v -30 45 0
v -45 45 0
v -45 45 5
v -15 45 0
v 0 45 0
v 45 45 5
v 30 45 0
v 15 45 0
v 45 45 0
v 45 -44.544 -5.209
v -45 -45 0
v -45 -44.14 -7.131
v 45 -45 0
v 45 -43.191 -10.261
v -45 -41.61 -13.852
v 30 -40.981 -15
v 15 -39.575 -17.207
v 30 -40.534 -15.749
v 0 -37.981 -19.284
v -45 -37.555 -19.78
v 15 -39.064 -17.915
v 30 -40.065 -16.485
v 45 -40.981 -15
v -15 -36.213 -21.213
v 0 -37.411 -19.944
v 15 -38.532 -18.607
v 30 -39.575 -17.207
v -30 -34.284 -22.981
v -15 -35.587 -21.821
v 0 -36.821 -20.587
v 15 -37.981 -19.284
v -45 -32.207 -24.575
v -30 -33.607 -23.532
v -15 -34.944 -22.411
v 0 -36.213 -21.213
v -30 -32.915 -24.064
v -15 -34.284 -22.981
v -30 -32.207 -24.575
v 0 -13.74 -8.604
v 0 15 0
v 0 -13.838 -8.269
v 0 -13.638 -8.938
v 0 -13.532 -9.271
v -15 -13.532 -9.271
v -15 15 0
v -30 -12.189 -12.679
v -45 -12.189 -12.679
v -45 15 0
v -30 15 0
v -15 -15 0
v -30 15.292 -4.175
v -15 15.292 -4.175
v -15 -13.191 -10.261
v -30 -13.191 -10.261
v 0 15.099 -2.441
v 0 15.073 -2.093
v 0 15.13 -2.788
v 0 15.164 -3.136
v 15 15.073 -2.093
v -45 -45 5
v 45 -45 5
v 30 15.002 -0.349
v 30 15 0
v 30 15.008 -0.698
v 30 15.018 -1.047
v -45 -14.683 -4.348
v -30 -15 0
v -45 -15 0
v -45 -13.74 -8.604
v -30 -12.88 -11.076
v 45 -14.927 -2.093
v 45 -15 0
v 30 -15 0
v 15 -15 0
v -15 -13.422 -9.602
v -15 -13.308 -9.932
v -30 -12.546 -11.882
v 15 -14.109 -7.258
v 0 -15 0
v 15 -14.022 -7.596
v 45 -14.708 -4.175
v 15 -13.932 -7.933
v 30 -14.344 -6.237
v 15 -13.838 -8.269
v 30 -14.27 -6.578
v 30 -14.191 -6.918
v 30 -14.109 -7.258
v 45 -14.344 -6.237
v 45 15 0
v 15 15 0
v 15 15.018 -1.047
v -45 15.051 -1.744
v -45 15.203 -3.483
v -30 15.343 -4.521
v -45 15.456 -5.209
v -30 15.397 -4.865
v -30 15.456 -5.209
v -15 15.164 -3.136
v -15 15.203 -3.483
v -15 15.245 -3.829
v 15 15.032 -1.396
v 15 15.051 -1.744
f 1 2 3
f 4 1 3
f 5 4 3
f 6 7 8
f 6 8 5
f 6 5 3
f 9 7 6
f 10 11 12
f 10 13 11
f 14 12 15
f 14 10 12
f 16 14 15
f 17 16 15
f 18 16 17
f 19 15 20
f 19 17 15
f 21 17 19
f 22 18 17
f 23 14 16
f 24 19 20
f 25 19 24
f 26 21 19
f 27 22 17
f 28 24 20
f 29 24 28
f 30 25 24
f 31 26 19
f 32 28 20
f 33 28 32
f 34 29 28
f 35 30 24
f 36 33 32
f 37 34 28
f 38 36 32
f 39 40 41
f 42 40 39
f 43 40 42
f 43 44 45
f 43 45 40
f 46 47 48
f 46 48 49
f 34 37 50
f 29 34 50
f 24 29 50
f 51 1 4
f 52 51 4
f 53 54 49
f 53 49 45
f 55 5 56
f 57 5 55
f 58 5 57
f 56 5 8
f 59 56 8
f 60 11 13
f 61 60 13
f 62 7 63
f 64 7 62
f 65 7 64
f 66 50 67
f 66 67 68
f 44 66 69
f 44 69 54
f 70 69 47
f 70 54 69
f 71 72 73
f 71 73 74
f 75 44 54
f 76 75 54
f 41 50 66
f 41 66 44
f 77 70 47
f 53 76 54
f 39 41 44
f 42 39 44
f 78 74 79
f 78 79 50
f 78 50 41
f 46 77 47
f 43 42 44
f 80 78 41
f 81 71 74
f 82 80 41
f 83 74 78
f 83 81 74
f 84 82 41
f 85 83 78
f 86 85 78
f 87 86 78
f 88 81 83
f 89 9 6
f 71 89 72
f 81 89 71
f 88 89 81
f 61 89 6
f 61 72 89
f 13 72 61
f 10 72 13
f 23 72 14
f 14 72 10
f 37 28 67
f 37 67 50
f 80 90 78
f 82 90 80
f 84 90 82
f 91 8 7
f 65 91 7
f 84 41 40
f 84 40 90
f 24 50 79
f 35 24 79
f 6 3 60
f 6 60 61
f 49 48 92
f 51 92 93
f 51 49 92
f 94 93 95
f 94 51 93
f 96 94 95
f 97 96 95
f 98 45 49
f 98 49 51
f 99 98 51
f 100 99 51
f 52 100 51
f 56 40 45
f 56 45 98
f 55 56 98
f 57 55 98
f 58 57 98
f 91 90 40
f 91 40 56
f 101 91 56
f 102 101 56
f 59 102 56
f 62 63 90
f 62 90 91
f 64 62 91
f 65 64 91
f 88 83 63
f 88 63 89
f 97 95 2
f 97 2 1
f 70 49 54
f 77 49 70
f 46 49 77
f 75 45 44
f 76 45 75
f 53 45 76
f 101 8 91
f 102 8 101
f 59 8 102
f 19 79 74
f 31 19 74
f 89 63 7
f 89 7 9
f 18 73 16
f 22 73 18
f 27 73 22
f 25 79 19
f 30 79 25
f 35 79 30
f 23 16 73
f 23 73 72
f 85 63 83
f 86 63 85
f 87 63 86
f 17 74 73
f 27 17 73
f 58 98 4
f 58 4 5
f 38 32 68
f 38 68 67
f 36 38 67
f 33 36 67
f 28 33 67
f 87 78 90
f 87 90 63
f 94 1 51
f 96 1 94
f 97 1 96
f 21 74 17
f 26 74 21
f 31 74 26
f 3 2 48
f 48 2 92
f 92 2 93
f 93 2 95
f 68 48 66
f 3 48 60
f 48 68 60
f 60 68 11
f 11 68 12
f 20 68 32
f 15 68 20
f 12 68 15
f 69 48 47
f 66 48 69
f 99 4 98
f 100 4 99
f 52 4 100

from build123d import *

# Parameters (mm, degrees)
F0_W      = 90
F0_H      = 90
F1_DEPTH  = 5
F2_W      = 15
F2_H      = 30
F3_ANGLE  = 2
F4_W      = 15
F4_H      = 30
F5_ANGLE  = -4
F6_W      = 15
F6_H      = 30
F7_ANGLE  = -6
F8_W      = 15
F8_H      = 30
F9_ANGLE  = -8
F10_W     = 15
F10_H     = 30
F11_ANGLE = -10
F12_W     = 15
F12_H     = 30
F13_ANGLE = -12
F14_W     = 15
F14_H     = 30
F15_ANGLE = -14
F16_W     = 15
F16_H     = 30
F17_ANGLE = -16
F18_W     = 15
F18_H     = 30
F19_ANGLE = -18
F20_W     = 15
F20_H     = 30
F21_ANGLE = -20
F22_W     = 15
F22_H     = 30
F23_ANGLE = -25
F24_W     = 15
F24_H     = 30
F25_ANGLE = -30
F26_W     = 15
F26_H     = 30
F27_ANGLE = -35
F28_W     = 15
F28_H     = 30
F29_ANGLE = -40
F30_W     = 15
F30_H     = 30
F31_ANGLE = -45
F32_W     = 15
F32_H     = 30
F33_ANGLE = -50
F34_W     = 15
F34_H     = 30
F35_ANGLE = -55


with BuildPart() as f1:
    # F0 (on Top) → F1 (new body)
    with BuildSketch(Plane.XY):
        Rectangle(F0_W, F0_H)
    extrude(amount=F1_DEPTH)

    # F2 (on Top) → F3 (revolve)
    with BuildSketch(Plane.XY):
        with Locations((22.5, 30)):
            Rectangle(F2_W, F2_H)
    revolve(axis=Axis((22.5, 45, 0), (1, 0, 0)), revolution_arc=F3_ANGLE)

    # F4 (on Top) → F5 (revolve)
    with BuildSketch(Plane.XY):
        with Locations((7.5, 30)):
            Rectangle(F4_W, F4_H)
    revolve(axis=Axis((7.5, 45, 0), (-1, 0, 0)), revolution_arc=F5_ANGLE)

    # F6 (on Top) → F7 (revolve)
    with BuildSketch(Plane.XY):
        with Locations((-7.5, 30)):
            Rectangle(F6_W, F6_H)
    revolve(axis=Axis((-7.5, 45, 0), (-1, 0, 0)), revolution_arc=F7_ANGLE)

    # F8 (on Top) → F9 (revolve)
    with BuildSketch(Plane.XY):
        with Locations((-22.5, 30)):
            Rectangle(F8_W, F8_H)
    revolve(axis=Axis((-22.5, 45, 0), (-1, 0, 0)), revolution_arc=F9_ANGLE)

    # F10 (on Top) → F11 (revolve)
    with BuildSketch(Plane.XY):
        with Locations((-37.5, 30)):
            Rectangle(F10_W, F10_H)
    revolve(axis=Axis((-37.5, 45, 0), (-1, 0, 0)), revolution_arc=F11_ANGLE)

    # F12 (on Top) → F13 (revolve)
    with BuildSketch(Plane.XY):
        with Locations((37.5, 0)):
            Rectangle(F12_W, F12_H)
    revolve(axis=Axis((37.5, 15, 0), (-1, 0, 0)), revolution_arc=F13_ANGLE)

    # F14 (on Top) → F15 (revolve)
    with BuildSketch(Plane.XY):
        with Locations((22.5, 0)):
            Rectangle(F14_W, F14_H)
    revolve(axis=Axis((22.5, 15, 0), (-1, 0, 0)), revolution_arc=F15_ANGLE)

    # F16 (on Top) → F17 (revolve)
    with BuildSketch(Plane.XY):
        with Locations((7.5, 0)):
            Rectangle(F16_W, F16_H)
    revolve(axis=Axis((7.5, 15, 0), (-1, 0, 0)), revolution_arc=F17_ANGLE)

    # F18 (on Top) → F19 (revolve)
    with BuildSketch(Plane.XY):
        with Locations((-7.5, 0)):
            Rectangle(F18_W, F18_H)
    revolve(axis=Axis((-7.5, 15, 0), (-1, 0, 0)), revolution_arc=F19_ANGLE)

    # F20 (on Top) → F21 (revolve)
    with BuildSketch(Plane.XY):
        with Locations((-22.5, 0)):
            Rectangle(F20_W, F20_H)
    revolve(axis=Axis((-22.5, 15, 0), (-1, 0, 0)), revolution_arc=F21_ANGLE)

    # F22 (on Top) → F23 (revolve)
    with BuildSketch(Plane.XY):
        with Locations((-37.5, 0)):
            Rectangle(F22_W, F22_H)
    revolve(axis=Axis((-37.5, 15, 0), (-1, 0, 0)), revolution_arc=F23_ANGLE)

    # F24 (on Top) → F25 (revolve)
    with BuildSketch(Plane.XY):
        with Locations((37.5, -30)):
            Rectangle(F24_W, F24_H)
    revolve(axis=Axis((37.5, -15, 0), (-1, 0, 0)), revolution_arc=F25_ANGLE)

    # F26 (on Top) → F27 (revolve)
    with BuildSketch(Plane.XY):
        with Locations((22.5, -30)):
            Rectangle(F26_W, F26_H)
    revolve(axis=Axis((22.5, -15, 0), (-1, 0, 0)), revolution_arc=F27_ANGLE)

    # F28 (on Top) → F29 (revolve)
    with BuildSketch(Plane.XY):
        with Locations((7.5, -30)):
            Rectangle(F28_W, F28_H)
    revolve(axis=Axis((7.5, -15, 0), (-1, 0, 0)), revolution_arc=F29_ANGLE)

    # F30 (on Top) → F31 (revolve)
    with BuildSketch(Plane.XY):
        with Locations((-7.5, -30)):
            Rectangle(F30_W, F30_H)
    revolve(axis=Axis((-7.5, -15, 0), (-1, 0, 0)), revolution_arc=F31_ANGLE)

    # F32 (on Top) → F33 (revolve)
    with BuildSketch(Plane.XY):
        with Locations((-22.5, -30)):
            Rectangle(F32_W, F32_H)
    revolve(axis=Axis((-22.5, -15, 0), (-1, 0, 0)), revolution_arc=F33_ANGLE)

    # F34 (on Top) → F35 (revolve)
    with BuildSketch(Plane.XY):
        with Locations((-37.5, -30)):
            Rectangle(F34_W, F34_H)
    revolve(axis=Axis((-37.5, -15, 0), (-1, 0, 0)), revolution_arc=F35_ANGLE)


solid = f1.part
